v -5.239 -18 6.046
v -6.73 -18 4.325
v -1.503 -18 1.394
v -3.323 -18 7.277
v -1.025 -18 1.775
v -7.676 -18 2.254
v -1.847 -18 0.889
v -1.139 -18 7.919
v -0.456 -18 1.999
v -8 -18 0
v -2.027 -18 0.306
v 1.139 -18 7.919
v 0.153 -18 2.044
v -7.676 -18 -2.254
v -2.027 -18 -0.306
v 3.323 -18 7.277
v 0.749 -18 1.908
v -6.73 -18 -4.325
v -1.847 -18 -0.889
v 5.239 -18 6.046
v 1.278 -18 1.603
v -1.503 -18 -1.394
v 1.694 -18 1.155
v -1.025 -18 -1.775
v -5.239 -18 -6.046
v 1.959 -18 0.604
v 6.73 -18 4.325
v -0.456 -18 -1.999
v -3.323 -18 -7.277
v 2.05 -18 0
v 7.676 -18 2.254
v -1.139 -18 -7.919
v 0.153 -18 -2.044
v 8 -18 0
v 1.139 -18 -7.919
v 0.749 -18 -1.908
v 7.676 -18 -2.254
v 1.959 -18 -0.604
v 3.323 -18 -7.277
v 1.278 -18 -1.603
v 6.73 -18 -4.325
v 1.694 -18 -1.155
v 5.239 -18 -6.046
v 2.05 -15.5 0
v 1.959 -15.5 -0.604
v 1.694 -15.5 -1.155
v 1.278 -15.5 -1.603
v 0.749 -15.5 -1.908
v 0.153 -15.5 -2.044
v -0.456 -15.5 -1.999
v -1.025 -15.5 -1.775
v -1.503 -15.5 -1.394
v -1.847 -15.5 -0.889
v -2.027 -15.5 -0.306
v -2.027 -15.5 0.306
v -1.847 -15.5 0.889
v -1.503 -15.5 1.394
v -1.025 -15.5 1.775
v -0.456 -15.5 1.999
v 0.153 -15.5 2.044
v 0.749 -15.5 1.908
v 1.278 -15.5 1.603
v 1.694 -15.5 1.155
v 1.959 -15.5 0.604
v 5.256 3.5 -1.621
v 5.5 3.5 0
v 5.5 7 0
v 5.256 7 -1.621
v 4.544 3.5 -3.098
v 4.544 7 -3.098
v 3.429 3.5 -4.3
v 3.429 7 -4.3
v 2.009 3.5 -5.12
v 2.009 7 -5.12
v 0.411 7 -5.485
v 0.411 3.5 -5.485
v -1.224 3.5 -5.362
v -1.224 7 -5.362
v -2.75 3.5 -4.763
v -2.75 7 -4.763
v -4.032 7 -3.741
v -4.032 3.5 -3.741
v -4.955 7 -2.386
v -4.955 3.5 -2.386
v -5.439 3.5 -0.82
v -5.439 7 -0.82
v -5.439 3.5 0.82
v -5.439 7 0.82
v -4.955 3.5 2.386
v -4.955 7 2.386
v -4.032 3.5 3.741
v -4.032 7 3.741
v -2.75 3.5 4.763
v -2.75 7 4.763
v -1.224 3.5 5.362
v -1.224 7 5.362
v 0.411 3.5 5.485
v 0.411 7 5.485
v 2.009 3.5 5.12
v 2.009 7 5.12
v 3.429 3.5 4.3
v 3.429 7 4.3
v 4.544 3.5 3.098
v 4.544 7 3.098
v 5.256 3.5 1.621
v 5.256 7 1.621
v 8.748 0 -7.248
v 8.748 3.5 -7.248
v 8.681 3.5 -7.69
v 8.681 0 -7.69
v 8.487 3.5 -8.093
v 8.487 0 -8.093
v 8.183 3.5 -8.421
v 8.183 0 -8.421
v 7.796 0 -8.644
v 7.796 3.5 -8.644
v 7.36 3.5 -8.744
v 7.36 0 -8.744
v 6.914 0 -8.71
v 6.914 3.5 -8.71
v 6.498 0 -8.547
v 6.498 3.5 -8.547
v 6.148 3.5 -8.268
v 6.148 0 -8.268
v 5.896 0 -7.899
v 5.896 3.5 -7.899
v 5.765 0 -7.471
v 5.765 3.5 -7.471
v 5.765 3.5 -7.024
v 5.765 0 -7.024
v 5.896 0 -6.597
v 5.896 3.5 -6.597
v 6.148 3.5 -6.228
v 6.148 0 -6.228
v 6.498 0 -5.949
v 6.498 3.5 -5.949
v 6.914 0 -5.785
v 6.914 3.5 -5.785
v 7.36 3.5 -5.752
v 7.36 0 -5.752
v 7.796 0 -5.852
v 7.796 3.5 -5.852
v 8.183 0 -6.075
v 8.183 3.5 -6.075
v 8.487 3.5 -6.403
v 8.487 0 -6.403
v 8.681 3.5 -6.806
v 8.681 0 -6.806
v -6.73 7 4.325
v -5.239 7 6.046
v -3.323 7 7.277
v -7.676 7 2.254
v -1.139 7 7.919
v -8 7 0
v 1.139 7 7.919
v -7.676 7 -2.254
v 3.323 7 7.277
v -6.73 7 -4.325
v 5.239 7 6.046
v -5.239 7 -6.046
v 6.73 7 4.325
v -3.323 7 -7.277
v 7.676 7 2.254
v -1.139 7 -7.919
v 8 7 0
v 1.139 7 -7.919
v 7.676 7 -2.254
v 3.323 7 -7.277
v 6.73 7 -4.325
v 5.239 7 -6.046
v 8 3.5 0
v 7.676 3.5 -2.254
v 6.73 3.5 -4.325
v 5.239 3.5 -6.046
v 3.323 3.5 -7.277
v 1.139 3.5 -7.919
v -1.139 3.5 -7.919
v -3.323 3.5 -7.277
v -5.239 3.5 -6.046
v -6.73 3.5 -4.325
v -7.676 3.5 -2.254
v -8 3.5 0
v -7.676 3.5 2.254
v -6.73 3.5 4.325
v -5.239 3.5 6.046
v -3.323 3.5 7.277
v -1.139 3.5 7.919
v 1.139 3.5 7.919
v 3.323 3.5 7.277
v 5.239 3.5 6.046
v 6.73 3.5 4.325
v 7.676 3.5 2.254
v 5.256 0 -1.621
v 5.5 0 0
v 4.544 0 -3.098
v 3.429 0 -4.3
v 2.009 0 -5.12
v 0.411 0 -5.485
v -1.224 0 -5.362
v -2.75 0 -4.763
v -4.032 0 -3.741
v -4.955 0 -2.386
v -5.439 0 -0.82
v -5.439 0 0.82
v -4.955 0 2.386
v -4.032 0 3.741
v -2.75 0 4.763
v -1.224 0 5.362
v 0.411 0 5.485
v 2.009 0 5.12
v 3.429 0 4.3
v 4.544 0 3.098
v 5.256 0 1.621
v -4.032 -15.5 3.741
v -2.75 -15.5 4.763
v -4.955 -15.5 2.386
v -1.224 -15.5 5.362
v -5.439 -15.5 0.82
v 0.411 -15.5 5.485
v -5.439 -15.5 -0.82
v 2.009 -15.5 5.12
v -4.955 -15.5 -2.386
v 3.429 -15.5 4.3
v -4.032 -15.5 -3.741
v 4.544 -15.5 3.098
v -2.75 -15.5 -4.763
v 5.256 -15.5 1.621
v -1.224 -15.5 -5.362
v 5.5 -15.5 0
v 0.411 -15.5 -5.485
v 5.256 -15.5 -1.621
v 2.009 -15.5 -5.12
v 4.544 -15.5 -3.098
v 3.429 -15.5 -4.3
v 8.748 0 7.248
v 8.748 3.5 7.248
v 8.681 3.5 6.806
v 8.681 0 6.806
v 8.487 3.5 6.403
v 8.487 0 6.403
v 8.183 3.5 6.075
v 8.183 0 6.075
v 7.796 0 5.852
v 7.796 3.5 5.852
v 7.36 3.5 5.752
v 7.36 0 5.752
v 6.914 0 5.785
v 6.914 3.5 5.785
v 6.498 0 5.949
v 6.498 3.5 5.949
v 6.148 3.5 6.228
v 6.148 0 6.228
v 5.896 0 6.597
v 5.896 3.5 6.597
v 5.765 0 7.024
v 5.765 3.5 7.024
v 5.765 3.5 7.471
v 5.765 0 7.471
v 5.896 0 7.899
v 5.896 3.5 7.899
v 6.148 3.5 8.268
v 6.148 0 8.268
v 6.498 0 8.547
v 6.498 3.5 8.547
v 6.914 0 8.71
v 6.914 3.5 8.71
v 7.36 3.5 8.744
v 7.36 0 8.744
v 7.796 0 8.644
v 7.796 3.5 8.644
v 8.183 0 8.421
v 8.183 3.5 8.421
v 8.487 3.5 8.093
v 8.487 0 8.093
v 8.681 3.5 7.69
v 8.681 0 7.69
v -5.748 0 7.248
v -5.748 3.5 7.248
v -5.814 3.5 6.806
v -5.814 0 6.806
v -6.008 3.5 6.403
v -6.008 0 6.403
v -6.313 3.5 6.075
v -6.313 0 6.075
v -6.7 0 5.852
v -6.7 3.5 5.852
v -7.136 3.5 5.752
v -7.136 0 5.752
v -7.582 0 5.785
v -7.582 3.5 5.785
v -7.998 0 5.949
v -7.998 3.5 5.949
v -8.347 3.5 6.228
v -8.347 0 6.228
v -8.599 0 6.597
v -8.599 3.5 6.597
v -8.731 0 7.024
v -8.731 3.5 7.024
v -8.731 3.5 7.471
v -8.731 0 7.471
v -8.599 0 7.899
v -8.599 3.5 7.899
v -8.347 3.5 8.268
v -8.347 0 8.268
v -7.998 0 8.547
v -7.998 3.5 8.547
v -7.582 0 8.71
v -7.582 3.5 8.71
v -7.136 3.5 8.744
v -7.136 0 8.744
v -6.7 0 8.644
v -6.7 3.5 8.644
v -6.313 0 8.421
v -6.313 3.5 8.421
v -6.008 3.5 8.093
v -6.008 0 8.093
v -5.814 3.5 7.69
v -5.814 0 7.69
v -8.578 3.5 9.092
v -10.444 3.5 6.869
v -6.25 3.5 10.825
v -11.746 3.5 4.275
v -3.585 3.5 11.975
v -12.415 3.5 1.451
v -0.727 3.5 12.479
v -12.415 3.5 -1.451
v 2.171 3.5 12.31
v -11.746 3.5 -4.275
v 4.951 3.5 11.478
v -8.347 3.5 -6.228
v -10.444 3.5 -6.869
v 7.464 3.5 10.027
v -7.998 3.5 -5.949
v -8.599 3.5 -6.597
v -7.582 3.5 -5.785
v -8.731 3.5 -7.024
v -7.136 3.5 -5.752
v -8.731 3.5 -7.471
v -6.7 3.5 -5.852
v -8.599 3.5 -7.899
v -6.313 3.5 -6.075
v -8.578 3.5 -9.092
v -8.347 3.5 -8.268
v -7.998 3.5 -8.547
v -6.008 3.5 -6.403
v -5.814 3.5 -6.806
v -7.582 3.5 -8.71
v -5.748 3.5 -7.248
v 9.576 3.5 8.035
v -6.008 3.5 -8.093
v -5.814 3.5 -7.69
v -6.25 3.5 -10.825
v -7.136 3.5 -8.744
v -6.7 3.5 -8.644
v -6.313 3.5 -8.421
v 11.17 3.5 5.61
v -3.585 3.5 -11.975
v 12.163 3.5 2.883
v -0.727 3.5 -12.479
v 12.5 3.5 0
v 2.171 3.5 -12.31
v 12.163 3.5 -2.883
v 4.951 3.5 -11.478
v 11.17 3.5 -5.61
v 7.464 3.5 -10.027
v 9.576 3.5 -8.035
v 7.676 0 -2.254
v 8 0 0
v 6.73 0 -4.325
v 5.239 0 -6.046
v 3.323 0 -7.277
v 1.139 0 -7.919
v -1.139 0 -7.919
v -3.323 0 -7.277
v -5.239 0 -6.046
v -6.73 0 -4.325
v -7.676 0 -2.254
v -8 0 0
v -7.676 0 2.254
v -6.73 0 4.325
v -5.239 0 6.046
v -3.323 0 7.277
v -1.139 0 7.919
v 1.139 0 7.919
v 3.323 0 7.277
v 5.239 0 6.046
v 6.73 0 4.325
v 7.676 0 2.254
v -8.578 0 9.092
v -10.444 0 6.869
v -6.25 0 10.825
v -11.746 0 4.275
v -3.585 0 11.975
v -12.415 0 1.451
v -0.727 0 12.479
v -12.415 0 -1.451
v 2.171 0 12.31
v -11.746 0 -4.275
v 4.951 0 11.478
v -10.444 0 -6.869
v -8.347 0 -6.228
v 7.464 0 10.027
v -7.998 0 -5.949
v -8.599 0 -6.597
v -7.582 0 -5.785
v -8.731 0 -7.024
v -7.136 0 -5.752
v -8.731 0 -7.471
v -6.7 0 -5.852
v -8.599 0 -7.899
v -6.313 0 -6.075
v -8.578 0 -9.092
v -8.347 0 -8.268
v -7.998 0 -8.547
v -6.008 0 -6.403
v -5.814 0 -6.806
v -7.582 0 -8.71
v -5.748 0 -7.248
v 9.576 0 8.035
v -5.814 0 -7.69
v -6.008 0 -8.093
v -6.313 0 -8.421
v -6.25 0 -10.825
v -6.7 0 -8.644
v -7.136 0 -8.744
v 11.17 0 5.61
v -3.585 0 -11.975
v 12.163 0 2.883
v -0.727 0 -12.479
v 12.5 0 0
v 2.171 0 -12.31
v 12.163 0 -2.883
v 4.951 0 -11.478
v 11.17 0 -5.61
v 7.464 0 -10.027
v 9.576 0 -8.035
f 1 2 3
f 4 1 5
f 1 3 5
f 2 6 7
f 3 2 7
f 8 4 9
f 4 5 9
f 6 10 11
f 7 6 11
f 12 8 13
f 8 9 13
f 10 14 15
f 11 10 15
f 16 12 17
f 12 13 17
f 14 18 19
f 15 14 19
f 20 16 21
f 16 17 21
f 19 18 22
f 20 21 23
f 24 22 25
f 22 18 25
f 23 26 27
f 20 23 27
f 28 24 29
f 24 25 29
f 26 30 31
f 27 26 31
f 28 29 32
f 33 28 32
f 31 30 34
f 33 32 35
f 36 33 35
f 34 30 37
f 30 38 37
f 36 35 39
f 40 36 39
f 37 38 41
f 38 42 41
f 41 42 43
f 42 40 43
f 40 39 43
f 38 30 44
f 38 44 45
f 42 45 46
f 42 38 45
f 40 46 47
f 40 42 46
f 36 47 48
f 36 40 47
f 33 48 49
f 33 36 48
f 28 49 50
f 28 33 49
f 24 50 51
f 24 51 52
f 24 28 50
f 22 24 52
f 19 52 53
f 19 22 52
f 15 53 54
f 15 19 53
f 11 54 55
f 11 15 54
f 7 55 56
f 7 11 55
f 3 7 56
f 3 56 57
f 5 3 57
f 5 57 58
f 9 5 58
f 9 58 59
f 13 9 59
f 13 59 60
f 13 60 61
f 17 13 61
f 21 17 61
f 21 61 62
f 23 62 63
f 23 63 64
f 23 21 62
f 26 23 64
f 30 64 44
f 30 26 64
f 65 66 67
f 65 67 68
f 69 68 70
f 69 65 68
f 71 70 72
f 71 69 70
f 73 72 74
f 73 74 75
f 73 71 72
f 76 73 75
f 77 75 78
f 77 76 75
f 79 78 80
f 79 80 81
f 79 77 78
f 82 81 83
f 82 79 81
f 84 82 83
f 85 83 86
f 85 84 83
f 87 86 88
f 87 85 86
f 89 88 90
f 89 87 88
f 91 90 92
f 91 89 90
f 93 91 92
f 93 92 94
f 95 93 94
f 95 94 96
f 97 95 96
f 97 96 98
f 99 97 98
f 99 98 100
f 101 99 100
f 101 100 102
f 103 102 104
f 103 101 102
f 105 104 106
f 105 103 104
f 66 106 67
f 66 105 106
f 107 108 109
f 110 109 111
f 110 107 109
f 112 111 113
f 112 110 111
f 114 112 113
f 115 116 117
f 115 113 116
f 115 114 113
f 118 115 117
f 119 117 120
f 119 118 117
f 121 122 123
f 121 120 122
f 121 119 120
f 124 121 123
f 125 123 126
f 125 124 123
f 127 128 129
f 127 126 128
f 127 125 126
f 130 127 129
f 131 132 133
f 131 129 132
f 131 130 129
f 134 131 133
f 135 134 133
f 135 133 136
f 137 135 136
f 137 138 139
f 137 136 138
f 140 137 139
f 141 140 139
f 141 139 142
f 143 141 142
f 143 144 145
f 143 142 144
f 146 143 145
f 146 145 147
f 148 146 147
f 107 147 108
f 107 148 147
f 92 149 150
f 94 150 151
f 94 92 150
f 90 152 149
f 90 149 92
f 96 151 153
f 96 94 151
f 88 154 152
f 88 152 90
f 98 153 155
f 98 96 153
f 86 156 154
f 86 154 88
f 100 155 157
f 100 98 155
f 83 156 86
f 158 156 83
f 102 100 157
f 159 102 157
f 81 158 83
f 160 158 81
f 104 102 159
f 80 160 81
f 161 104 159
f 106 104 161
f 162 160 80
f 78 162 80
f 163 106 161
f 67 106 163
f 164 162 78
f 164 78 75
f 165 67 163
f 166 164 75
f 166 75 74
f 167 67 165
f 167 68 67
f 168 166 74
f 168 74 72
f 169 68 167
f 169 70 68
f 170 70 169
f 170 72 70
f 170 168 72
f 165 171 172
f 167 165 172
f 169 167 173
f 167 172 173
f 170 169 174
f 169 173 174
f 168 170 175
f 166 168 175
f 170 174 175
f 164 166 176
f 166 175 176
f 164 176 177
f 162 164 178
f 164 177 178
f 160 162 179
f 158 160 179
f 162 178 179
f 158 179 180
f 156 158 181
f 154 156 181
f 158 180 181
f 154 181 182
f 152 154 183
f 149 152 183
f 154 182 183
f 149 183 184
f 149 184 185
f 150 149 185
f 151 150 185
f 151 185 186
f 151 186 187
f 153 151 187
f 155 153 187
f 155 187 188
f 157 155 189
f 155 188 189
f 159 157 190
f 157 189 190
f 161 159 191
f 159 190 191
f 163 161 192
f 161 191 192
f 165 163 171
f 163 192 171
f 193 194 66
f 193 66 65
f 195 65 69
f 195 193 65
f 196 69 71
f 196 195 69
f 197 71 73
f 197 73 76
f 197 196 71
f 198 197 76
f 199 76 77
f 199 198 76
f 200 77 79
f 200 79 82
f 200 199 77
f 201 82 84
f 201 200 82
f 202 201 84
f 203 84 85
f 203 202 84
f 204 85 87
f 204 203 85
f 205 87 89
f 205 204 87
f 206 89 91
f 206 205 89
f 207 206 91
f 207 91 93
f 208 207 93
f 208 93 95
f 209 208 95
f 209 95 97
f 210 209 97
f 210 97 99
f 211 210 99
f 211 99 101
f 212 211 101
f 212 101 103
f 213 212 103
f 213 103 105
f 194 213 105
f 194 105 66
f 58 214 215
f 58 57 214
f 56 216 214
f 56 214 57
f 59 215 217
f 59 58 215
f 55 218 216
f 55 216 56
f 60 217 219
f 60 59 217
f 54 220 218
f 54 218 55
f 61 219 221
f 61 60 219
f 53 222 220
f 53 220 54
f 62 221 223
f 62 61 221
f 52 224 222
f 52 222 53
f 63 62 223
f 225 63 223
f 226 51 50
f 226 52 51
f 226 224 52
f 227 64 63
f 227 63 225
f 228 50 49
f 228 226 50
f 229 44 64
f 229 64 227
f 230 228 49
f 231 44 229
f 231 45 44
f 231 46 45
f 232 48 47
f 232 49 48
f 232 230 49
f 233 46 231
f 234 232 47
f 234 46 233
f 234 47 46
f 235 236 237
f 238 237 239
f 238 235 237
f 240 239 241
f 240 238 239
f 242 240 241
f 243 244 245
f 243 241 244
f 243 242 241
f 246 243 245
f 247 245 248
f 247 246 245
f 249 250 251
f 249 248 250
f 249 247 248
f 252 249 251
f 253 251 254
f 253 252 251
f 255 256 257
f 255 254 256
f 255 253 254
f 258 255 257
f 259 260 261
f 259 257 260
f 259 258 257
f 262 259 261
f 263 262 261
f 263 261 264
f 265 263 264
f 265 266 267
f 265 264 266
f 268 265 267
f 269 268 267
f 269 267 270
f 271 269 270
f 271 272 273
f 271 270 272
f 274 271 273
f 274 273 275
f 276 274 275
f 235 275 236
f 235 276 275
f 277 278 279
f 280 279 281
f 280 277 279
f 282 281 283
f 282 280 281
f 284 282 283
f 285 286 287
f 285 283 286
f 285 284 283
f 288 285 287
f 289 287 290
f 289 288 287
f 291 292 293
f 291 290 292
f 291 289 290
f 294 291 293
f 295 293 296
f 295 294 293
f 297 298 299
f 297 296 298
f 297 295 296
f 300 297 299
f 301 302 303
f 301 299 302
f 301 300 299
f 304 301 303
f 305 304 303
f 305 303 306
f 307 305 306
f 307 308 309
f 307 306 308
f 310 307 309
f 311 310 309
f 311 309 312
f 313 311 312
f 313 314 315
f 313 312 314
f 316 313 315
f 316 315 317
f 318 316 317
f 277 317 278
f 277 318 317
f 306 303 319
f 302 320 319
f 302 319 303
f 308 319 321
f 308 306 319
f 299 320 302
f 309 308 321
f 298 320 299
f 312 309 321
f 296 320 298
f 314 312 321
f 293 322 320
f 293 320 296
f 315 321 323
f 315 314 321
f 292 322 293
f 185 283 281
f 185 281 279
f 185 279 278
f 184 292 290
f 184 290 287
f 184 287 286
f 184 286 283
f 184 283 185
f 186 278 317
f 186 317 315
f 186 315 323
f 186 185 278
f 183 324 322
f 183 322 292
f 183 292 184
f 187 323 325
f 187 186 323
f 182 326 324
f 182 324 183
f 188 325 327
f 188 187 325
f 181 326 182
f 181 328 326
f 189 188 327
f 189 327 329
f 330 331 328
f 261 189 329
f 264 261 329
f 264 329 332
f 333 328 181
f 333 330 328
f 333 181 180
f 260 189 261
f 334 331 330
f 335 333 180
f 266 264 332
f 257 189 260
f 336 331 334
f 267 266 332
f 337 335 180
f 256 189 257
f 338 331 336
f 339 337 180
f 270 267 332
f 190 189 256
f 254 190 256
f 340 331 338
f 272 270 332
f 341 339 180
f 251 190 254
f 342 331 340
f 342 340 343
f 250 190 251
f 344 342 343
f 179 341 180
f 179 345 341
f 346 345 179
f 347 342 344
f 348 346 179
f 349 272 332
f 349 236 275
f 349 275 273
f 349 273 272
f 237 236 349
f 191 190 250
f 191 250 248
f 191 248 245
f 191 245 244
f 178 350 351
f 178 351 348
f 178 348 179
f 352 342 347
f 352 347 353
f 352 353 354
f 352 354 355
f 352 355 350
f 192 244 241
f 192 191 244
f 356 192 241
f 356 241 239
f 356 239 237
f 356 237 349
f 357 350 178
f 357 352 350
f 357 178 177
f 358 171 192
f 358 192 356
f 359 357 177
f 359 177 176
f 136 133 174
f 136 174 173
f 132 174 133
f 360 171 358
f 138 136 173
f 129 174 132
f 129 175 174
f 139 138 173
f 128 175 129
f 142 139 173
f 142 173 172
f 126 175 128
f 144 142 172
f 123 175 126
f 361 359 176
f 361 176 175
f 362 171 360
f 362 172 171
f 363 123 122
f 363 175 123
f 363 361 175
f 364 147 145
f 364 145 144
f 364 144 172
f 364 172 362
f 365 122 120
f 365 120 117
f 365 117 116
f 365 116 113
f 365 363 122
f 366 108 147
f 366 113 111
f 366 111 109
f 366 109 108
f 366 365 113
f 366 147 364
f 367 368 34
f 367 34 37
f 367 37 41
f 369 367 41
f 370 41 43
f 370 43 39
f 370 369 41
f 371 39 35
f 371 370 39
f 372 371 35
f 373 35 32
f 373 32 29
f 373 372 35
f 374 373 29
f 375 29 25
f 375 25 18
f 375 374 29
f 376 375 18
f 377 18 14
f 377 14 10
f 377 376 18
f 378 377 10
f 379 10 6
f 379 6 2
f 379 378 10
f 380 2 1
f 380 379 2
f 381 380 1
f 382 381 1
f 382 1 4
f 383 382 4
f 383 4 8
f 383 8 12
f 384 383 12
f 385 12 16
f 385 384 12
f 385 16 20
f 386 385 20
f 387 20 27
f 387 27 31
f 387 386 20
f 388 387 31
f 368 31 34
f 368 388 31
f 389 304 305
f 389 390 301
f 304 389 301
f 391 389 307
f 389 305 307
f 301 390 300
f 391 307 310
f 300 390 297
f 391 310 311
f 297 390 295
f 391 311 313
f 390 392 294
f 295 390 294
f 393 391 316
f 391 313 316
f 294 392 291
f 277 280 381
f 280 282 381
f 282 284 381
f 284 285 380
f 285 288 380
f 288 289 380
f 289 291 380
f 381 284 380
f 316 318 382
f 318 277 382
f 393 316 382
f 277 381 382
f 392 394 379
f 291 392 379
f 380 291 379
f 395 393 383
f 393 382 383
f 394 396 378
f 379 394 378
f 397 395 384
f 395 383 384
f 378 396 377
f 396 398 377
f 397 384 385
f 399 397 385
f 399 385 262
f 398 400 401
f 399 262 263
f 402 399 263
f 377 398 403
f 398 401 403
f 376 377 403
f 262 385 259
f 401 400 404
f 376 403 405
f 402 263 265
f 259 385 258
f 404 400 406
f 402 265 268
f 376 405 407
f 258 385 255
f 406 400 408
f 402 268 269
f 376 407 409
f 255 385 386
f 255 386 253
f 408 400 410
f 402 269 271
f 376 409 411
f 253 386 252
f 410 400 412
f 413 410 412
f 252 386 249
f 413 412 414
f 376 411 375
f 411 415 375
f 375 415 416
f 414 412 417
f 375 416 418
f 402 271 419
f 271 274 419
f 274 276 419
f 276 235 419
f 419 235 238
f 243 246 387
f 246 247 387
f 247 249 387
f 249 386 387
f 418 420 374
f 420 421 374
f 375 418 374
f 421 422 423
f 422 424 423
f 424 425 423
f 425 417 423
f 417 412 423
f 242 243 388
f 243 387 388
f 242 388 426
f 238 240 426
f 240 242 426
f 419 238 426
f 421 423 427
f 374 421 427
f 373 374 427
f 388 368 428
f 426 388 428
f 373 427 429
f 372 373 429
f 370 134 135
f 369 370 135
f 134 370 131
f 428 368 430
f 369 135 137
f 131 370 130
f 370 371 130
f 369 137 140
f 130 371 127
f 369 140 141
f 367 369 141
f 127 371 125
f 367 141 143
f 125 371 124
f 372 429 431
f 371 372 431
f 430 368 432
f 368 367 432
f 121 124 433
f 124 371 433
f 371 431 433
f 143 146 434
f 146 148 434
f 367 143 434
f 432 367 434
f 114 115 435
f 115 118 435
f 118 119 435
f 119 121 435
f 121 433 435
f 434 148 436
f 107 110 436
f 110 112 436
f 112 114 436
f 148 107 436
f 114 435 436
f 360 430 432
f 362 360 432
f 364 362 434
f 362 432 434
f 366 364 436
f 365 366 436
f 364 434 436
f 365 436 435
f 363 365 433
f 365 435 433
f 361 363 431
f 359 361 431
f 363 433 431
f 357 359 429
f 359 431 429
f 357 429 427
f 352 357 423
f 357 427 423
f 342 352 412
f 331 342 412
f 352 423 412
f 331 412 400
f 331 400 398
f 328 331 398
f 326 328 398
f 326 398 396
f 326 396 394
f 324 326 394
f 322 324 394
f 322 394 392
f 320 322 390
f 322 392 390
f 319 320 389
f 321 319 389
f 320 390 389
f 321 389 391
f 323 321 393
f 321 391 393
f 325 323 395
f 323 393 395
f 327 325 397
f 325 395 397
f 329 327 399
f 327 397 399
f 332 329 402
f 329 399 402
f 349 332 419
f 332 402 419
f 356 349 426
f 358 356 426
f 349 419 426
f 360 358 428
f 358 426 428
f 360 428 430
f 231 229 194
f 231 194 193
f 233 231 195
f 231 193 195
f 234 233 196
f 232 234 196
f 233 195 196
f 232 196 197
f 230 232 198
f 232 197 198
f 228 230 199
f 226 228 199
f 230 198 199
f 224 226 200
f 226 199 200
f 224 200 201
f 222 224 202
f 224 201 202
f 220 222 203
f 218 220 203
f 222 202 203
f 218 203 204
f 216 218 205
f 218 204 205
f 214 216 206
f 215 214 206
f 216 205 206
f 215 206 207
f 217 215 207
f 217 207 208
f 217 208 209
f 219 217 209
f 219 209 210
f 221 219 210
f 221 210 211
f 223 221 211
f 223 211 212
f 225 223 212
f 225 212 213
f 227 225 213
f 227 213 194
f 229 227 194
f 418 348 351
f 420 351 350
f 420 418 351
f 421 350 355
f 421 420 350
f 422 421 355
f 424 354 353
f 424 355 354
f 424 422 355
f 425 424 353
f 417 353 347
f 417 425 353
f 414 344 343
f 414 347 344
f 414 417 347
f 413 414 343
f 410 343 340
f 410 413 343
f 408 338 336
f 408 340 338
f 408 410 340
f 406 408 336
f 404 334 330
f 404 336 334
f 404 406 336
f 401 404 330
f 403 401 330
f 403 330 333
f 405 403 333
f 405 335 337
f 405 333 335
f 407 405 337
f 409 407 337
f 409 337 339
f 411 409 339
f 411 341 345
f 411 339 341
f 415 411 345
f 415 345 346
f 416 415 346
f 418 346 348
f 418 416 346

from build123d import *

# Parameters (mm, degrees)
SKETCH1_R           = 12.5
BOSS_EXTRUDE1_DEPTH = 3.5
BOSS_EXTRUDE2_START = 3.5
SKETCH2_R           = 8
SKETCH2_R_2         = 5.5
BOSS_EXTRUDE2_DEPTH = 3.5
SKETCH2_2_R         = 8
SKETCH2_2_R_2       = 5.5
BOSS_EXTRUDE3_DEPTH = 18
SKETCH3_R           = 5.5
CUT_EXTRUDE1_DEPTH  = 8
BOSS_EXTRUDE4_START = -18
SKETCH4_R           = 5.5
SKETCH4_R_2         = 2.05
BOSS_EXTRUDE4_DEPTH = 2.5
SKETCH5_R           = 1.5
CUT_EXTRUDE2_DEPTH  = 8


with BuildPart() as part:
    # Sketch1 → Boss-Extrude1 (new body)
    with BuildSketch(Plane(origin=(0, 0, 0), x_dir=(1, 0, 0), z_dir=(0, 1, 0))):
        Circle(SKETCH1_R)
    extrude(amount=BOSS_EXTRUDE1_DEPTH)

    # Sketch2 → Boss-Extrude2 (add)
    with BuildSketch(Plane(origin=(0, 0, 0), x_dir=(1, 0, 0), z_dir=(0, 1, 0)).offset(BOSS_EXTRUDE2_START)):
        Circle(SKETCH2_R)
        Circle(SKETCH2_R_2, mode=Mode.SUBTRACT)
    extrude(amount=BOSS_EXTRUDE2_DEPTH)

    # Sketch2<2> → Boss-Extrude3 (add)
    with BuildSketch(Plane(origin=(0, 0, 0), x_dir=(1, 0, 0), z_dir=(0, 1, 0))):
        Circle(SKETCH2_2_R)
        Circle(SKETCH2_2_R_2, mode=Mode.SUBTRACT)
    extrude(amount=-BOSS_EXTRUDE3_DEPTH)

    # Sketch3 → Cut-Extrude1 (cut, through all)
    with BuildSketch(Plane(origin=(0, 0, 0), x_dir=(1, 0, 0), z_dir=(0, 1, 0))):
        Circle(SKETCH3_R)
    extrude(amount=CUT_EXTRUDE1_DEPTH, mode=Mode.SUBTRACT)

    # Sketch4 → Boss-Extrude4 (add)
    with BuildSketch(Plane(origin=(0, 0, 0), x_dir=(1, 0, 0), z_dir=(0, 1, 0)).offset(BOSS_EXTRUDE4_START)):
        Circle(SKETCH4_R)
        Circle(SKETCH4_R_2, mode=Mode.SUBTRACT)
    extrude(amount=BOSS_EXTRUDE4_DEPTH)

    # Sketch5 → Cut-Extrude2 (cut, through all)
    with BuildSketch(Plane(origin=(0, 0, 0), x_dir=(1, 0, 0), z_dir=(0, 1, 0))):
        with Locations((-7.247844507, 7.247844507)):
            Circle(SKETCH5_R)
        with Locations((7.247844507, 7.247844507)):
            Circle(SKETCH5_R)
        with Locations((7.247844507, -7.247844507)):
            Circle(SKETCH5_R)
        with Locations((-7.247844507, -7.247844507)):
            Circle(SKETCH5_R)
    extrude(amount=CUT_EXTRUDE2_DEPTH, mode=Mode.SUBTRACT)


solid = part.part
